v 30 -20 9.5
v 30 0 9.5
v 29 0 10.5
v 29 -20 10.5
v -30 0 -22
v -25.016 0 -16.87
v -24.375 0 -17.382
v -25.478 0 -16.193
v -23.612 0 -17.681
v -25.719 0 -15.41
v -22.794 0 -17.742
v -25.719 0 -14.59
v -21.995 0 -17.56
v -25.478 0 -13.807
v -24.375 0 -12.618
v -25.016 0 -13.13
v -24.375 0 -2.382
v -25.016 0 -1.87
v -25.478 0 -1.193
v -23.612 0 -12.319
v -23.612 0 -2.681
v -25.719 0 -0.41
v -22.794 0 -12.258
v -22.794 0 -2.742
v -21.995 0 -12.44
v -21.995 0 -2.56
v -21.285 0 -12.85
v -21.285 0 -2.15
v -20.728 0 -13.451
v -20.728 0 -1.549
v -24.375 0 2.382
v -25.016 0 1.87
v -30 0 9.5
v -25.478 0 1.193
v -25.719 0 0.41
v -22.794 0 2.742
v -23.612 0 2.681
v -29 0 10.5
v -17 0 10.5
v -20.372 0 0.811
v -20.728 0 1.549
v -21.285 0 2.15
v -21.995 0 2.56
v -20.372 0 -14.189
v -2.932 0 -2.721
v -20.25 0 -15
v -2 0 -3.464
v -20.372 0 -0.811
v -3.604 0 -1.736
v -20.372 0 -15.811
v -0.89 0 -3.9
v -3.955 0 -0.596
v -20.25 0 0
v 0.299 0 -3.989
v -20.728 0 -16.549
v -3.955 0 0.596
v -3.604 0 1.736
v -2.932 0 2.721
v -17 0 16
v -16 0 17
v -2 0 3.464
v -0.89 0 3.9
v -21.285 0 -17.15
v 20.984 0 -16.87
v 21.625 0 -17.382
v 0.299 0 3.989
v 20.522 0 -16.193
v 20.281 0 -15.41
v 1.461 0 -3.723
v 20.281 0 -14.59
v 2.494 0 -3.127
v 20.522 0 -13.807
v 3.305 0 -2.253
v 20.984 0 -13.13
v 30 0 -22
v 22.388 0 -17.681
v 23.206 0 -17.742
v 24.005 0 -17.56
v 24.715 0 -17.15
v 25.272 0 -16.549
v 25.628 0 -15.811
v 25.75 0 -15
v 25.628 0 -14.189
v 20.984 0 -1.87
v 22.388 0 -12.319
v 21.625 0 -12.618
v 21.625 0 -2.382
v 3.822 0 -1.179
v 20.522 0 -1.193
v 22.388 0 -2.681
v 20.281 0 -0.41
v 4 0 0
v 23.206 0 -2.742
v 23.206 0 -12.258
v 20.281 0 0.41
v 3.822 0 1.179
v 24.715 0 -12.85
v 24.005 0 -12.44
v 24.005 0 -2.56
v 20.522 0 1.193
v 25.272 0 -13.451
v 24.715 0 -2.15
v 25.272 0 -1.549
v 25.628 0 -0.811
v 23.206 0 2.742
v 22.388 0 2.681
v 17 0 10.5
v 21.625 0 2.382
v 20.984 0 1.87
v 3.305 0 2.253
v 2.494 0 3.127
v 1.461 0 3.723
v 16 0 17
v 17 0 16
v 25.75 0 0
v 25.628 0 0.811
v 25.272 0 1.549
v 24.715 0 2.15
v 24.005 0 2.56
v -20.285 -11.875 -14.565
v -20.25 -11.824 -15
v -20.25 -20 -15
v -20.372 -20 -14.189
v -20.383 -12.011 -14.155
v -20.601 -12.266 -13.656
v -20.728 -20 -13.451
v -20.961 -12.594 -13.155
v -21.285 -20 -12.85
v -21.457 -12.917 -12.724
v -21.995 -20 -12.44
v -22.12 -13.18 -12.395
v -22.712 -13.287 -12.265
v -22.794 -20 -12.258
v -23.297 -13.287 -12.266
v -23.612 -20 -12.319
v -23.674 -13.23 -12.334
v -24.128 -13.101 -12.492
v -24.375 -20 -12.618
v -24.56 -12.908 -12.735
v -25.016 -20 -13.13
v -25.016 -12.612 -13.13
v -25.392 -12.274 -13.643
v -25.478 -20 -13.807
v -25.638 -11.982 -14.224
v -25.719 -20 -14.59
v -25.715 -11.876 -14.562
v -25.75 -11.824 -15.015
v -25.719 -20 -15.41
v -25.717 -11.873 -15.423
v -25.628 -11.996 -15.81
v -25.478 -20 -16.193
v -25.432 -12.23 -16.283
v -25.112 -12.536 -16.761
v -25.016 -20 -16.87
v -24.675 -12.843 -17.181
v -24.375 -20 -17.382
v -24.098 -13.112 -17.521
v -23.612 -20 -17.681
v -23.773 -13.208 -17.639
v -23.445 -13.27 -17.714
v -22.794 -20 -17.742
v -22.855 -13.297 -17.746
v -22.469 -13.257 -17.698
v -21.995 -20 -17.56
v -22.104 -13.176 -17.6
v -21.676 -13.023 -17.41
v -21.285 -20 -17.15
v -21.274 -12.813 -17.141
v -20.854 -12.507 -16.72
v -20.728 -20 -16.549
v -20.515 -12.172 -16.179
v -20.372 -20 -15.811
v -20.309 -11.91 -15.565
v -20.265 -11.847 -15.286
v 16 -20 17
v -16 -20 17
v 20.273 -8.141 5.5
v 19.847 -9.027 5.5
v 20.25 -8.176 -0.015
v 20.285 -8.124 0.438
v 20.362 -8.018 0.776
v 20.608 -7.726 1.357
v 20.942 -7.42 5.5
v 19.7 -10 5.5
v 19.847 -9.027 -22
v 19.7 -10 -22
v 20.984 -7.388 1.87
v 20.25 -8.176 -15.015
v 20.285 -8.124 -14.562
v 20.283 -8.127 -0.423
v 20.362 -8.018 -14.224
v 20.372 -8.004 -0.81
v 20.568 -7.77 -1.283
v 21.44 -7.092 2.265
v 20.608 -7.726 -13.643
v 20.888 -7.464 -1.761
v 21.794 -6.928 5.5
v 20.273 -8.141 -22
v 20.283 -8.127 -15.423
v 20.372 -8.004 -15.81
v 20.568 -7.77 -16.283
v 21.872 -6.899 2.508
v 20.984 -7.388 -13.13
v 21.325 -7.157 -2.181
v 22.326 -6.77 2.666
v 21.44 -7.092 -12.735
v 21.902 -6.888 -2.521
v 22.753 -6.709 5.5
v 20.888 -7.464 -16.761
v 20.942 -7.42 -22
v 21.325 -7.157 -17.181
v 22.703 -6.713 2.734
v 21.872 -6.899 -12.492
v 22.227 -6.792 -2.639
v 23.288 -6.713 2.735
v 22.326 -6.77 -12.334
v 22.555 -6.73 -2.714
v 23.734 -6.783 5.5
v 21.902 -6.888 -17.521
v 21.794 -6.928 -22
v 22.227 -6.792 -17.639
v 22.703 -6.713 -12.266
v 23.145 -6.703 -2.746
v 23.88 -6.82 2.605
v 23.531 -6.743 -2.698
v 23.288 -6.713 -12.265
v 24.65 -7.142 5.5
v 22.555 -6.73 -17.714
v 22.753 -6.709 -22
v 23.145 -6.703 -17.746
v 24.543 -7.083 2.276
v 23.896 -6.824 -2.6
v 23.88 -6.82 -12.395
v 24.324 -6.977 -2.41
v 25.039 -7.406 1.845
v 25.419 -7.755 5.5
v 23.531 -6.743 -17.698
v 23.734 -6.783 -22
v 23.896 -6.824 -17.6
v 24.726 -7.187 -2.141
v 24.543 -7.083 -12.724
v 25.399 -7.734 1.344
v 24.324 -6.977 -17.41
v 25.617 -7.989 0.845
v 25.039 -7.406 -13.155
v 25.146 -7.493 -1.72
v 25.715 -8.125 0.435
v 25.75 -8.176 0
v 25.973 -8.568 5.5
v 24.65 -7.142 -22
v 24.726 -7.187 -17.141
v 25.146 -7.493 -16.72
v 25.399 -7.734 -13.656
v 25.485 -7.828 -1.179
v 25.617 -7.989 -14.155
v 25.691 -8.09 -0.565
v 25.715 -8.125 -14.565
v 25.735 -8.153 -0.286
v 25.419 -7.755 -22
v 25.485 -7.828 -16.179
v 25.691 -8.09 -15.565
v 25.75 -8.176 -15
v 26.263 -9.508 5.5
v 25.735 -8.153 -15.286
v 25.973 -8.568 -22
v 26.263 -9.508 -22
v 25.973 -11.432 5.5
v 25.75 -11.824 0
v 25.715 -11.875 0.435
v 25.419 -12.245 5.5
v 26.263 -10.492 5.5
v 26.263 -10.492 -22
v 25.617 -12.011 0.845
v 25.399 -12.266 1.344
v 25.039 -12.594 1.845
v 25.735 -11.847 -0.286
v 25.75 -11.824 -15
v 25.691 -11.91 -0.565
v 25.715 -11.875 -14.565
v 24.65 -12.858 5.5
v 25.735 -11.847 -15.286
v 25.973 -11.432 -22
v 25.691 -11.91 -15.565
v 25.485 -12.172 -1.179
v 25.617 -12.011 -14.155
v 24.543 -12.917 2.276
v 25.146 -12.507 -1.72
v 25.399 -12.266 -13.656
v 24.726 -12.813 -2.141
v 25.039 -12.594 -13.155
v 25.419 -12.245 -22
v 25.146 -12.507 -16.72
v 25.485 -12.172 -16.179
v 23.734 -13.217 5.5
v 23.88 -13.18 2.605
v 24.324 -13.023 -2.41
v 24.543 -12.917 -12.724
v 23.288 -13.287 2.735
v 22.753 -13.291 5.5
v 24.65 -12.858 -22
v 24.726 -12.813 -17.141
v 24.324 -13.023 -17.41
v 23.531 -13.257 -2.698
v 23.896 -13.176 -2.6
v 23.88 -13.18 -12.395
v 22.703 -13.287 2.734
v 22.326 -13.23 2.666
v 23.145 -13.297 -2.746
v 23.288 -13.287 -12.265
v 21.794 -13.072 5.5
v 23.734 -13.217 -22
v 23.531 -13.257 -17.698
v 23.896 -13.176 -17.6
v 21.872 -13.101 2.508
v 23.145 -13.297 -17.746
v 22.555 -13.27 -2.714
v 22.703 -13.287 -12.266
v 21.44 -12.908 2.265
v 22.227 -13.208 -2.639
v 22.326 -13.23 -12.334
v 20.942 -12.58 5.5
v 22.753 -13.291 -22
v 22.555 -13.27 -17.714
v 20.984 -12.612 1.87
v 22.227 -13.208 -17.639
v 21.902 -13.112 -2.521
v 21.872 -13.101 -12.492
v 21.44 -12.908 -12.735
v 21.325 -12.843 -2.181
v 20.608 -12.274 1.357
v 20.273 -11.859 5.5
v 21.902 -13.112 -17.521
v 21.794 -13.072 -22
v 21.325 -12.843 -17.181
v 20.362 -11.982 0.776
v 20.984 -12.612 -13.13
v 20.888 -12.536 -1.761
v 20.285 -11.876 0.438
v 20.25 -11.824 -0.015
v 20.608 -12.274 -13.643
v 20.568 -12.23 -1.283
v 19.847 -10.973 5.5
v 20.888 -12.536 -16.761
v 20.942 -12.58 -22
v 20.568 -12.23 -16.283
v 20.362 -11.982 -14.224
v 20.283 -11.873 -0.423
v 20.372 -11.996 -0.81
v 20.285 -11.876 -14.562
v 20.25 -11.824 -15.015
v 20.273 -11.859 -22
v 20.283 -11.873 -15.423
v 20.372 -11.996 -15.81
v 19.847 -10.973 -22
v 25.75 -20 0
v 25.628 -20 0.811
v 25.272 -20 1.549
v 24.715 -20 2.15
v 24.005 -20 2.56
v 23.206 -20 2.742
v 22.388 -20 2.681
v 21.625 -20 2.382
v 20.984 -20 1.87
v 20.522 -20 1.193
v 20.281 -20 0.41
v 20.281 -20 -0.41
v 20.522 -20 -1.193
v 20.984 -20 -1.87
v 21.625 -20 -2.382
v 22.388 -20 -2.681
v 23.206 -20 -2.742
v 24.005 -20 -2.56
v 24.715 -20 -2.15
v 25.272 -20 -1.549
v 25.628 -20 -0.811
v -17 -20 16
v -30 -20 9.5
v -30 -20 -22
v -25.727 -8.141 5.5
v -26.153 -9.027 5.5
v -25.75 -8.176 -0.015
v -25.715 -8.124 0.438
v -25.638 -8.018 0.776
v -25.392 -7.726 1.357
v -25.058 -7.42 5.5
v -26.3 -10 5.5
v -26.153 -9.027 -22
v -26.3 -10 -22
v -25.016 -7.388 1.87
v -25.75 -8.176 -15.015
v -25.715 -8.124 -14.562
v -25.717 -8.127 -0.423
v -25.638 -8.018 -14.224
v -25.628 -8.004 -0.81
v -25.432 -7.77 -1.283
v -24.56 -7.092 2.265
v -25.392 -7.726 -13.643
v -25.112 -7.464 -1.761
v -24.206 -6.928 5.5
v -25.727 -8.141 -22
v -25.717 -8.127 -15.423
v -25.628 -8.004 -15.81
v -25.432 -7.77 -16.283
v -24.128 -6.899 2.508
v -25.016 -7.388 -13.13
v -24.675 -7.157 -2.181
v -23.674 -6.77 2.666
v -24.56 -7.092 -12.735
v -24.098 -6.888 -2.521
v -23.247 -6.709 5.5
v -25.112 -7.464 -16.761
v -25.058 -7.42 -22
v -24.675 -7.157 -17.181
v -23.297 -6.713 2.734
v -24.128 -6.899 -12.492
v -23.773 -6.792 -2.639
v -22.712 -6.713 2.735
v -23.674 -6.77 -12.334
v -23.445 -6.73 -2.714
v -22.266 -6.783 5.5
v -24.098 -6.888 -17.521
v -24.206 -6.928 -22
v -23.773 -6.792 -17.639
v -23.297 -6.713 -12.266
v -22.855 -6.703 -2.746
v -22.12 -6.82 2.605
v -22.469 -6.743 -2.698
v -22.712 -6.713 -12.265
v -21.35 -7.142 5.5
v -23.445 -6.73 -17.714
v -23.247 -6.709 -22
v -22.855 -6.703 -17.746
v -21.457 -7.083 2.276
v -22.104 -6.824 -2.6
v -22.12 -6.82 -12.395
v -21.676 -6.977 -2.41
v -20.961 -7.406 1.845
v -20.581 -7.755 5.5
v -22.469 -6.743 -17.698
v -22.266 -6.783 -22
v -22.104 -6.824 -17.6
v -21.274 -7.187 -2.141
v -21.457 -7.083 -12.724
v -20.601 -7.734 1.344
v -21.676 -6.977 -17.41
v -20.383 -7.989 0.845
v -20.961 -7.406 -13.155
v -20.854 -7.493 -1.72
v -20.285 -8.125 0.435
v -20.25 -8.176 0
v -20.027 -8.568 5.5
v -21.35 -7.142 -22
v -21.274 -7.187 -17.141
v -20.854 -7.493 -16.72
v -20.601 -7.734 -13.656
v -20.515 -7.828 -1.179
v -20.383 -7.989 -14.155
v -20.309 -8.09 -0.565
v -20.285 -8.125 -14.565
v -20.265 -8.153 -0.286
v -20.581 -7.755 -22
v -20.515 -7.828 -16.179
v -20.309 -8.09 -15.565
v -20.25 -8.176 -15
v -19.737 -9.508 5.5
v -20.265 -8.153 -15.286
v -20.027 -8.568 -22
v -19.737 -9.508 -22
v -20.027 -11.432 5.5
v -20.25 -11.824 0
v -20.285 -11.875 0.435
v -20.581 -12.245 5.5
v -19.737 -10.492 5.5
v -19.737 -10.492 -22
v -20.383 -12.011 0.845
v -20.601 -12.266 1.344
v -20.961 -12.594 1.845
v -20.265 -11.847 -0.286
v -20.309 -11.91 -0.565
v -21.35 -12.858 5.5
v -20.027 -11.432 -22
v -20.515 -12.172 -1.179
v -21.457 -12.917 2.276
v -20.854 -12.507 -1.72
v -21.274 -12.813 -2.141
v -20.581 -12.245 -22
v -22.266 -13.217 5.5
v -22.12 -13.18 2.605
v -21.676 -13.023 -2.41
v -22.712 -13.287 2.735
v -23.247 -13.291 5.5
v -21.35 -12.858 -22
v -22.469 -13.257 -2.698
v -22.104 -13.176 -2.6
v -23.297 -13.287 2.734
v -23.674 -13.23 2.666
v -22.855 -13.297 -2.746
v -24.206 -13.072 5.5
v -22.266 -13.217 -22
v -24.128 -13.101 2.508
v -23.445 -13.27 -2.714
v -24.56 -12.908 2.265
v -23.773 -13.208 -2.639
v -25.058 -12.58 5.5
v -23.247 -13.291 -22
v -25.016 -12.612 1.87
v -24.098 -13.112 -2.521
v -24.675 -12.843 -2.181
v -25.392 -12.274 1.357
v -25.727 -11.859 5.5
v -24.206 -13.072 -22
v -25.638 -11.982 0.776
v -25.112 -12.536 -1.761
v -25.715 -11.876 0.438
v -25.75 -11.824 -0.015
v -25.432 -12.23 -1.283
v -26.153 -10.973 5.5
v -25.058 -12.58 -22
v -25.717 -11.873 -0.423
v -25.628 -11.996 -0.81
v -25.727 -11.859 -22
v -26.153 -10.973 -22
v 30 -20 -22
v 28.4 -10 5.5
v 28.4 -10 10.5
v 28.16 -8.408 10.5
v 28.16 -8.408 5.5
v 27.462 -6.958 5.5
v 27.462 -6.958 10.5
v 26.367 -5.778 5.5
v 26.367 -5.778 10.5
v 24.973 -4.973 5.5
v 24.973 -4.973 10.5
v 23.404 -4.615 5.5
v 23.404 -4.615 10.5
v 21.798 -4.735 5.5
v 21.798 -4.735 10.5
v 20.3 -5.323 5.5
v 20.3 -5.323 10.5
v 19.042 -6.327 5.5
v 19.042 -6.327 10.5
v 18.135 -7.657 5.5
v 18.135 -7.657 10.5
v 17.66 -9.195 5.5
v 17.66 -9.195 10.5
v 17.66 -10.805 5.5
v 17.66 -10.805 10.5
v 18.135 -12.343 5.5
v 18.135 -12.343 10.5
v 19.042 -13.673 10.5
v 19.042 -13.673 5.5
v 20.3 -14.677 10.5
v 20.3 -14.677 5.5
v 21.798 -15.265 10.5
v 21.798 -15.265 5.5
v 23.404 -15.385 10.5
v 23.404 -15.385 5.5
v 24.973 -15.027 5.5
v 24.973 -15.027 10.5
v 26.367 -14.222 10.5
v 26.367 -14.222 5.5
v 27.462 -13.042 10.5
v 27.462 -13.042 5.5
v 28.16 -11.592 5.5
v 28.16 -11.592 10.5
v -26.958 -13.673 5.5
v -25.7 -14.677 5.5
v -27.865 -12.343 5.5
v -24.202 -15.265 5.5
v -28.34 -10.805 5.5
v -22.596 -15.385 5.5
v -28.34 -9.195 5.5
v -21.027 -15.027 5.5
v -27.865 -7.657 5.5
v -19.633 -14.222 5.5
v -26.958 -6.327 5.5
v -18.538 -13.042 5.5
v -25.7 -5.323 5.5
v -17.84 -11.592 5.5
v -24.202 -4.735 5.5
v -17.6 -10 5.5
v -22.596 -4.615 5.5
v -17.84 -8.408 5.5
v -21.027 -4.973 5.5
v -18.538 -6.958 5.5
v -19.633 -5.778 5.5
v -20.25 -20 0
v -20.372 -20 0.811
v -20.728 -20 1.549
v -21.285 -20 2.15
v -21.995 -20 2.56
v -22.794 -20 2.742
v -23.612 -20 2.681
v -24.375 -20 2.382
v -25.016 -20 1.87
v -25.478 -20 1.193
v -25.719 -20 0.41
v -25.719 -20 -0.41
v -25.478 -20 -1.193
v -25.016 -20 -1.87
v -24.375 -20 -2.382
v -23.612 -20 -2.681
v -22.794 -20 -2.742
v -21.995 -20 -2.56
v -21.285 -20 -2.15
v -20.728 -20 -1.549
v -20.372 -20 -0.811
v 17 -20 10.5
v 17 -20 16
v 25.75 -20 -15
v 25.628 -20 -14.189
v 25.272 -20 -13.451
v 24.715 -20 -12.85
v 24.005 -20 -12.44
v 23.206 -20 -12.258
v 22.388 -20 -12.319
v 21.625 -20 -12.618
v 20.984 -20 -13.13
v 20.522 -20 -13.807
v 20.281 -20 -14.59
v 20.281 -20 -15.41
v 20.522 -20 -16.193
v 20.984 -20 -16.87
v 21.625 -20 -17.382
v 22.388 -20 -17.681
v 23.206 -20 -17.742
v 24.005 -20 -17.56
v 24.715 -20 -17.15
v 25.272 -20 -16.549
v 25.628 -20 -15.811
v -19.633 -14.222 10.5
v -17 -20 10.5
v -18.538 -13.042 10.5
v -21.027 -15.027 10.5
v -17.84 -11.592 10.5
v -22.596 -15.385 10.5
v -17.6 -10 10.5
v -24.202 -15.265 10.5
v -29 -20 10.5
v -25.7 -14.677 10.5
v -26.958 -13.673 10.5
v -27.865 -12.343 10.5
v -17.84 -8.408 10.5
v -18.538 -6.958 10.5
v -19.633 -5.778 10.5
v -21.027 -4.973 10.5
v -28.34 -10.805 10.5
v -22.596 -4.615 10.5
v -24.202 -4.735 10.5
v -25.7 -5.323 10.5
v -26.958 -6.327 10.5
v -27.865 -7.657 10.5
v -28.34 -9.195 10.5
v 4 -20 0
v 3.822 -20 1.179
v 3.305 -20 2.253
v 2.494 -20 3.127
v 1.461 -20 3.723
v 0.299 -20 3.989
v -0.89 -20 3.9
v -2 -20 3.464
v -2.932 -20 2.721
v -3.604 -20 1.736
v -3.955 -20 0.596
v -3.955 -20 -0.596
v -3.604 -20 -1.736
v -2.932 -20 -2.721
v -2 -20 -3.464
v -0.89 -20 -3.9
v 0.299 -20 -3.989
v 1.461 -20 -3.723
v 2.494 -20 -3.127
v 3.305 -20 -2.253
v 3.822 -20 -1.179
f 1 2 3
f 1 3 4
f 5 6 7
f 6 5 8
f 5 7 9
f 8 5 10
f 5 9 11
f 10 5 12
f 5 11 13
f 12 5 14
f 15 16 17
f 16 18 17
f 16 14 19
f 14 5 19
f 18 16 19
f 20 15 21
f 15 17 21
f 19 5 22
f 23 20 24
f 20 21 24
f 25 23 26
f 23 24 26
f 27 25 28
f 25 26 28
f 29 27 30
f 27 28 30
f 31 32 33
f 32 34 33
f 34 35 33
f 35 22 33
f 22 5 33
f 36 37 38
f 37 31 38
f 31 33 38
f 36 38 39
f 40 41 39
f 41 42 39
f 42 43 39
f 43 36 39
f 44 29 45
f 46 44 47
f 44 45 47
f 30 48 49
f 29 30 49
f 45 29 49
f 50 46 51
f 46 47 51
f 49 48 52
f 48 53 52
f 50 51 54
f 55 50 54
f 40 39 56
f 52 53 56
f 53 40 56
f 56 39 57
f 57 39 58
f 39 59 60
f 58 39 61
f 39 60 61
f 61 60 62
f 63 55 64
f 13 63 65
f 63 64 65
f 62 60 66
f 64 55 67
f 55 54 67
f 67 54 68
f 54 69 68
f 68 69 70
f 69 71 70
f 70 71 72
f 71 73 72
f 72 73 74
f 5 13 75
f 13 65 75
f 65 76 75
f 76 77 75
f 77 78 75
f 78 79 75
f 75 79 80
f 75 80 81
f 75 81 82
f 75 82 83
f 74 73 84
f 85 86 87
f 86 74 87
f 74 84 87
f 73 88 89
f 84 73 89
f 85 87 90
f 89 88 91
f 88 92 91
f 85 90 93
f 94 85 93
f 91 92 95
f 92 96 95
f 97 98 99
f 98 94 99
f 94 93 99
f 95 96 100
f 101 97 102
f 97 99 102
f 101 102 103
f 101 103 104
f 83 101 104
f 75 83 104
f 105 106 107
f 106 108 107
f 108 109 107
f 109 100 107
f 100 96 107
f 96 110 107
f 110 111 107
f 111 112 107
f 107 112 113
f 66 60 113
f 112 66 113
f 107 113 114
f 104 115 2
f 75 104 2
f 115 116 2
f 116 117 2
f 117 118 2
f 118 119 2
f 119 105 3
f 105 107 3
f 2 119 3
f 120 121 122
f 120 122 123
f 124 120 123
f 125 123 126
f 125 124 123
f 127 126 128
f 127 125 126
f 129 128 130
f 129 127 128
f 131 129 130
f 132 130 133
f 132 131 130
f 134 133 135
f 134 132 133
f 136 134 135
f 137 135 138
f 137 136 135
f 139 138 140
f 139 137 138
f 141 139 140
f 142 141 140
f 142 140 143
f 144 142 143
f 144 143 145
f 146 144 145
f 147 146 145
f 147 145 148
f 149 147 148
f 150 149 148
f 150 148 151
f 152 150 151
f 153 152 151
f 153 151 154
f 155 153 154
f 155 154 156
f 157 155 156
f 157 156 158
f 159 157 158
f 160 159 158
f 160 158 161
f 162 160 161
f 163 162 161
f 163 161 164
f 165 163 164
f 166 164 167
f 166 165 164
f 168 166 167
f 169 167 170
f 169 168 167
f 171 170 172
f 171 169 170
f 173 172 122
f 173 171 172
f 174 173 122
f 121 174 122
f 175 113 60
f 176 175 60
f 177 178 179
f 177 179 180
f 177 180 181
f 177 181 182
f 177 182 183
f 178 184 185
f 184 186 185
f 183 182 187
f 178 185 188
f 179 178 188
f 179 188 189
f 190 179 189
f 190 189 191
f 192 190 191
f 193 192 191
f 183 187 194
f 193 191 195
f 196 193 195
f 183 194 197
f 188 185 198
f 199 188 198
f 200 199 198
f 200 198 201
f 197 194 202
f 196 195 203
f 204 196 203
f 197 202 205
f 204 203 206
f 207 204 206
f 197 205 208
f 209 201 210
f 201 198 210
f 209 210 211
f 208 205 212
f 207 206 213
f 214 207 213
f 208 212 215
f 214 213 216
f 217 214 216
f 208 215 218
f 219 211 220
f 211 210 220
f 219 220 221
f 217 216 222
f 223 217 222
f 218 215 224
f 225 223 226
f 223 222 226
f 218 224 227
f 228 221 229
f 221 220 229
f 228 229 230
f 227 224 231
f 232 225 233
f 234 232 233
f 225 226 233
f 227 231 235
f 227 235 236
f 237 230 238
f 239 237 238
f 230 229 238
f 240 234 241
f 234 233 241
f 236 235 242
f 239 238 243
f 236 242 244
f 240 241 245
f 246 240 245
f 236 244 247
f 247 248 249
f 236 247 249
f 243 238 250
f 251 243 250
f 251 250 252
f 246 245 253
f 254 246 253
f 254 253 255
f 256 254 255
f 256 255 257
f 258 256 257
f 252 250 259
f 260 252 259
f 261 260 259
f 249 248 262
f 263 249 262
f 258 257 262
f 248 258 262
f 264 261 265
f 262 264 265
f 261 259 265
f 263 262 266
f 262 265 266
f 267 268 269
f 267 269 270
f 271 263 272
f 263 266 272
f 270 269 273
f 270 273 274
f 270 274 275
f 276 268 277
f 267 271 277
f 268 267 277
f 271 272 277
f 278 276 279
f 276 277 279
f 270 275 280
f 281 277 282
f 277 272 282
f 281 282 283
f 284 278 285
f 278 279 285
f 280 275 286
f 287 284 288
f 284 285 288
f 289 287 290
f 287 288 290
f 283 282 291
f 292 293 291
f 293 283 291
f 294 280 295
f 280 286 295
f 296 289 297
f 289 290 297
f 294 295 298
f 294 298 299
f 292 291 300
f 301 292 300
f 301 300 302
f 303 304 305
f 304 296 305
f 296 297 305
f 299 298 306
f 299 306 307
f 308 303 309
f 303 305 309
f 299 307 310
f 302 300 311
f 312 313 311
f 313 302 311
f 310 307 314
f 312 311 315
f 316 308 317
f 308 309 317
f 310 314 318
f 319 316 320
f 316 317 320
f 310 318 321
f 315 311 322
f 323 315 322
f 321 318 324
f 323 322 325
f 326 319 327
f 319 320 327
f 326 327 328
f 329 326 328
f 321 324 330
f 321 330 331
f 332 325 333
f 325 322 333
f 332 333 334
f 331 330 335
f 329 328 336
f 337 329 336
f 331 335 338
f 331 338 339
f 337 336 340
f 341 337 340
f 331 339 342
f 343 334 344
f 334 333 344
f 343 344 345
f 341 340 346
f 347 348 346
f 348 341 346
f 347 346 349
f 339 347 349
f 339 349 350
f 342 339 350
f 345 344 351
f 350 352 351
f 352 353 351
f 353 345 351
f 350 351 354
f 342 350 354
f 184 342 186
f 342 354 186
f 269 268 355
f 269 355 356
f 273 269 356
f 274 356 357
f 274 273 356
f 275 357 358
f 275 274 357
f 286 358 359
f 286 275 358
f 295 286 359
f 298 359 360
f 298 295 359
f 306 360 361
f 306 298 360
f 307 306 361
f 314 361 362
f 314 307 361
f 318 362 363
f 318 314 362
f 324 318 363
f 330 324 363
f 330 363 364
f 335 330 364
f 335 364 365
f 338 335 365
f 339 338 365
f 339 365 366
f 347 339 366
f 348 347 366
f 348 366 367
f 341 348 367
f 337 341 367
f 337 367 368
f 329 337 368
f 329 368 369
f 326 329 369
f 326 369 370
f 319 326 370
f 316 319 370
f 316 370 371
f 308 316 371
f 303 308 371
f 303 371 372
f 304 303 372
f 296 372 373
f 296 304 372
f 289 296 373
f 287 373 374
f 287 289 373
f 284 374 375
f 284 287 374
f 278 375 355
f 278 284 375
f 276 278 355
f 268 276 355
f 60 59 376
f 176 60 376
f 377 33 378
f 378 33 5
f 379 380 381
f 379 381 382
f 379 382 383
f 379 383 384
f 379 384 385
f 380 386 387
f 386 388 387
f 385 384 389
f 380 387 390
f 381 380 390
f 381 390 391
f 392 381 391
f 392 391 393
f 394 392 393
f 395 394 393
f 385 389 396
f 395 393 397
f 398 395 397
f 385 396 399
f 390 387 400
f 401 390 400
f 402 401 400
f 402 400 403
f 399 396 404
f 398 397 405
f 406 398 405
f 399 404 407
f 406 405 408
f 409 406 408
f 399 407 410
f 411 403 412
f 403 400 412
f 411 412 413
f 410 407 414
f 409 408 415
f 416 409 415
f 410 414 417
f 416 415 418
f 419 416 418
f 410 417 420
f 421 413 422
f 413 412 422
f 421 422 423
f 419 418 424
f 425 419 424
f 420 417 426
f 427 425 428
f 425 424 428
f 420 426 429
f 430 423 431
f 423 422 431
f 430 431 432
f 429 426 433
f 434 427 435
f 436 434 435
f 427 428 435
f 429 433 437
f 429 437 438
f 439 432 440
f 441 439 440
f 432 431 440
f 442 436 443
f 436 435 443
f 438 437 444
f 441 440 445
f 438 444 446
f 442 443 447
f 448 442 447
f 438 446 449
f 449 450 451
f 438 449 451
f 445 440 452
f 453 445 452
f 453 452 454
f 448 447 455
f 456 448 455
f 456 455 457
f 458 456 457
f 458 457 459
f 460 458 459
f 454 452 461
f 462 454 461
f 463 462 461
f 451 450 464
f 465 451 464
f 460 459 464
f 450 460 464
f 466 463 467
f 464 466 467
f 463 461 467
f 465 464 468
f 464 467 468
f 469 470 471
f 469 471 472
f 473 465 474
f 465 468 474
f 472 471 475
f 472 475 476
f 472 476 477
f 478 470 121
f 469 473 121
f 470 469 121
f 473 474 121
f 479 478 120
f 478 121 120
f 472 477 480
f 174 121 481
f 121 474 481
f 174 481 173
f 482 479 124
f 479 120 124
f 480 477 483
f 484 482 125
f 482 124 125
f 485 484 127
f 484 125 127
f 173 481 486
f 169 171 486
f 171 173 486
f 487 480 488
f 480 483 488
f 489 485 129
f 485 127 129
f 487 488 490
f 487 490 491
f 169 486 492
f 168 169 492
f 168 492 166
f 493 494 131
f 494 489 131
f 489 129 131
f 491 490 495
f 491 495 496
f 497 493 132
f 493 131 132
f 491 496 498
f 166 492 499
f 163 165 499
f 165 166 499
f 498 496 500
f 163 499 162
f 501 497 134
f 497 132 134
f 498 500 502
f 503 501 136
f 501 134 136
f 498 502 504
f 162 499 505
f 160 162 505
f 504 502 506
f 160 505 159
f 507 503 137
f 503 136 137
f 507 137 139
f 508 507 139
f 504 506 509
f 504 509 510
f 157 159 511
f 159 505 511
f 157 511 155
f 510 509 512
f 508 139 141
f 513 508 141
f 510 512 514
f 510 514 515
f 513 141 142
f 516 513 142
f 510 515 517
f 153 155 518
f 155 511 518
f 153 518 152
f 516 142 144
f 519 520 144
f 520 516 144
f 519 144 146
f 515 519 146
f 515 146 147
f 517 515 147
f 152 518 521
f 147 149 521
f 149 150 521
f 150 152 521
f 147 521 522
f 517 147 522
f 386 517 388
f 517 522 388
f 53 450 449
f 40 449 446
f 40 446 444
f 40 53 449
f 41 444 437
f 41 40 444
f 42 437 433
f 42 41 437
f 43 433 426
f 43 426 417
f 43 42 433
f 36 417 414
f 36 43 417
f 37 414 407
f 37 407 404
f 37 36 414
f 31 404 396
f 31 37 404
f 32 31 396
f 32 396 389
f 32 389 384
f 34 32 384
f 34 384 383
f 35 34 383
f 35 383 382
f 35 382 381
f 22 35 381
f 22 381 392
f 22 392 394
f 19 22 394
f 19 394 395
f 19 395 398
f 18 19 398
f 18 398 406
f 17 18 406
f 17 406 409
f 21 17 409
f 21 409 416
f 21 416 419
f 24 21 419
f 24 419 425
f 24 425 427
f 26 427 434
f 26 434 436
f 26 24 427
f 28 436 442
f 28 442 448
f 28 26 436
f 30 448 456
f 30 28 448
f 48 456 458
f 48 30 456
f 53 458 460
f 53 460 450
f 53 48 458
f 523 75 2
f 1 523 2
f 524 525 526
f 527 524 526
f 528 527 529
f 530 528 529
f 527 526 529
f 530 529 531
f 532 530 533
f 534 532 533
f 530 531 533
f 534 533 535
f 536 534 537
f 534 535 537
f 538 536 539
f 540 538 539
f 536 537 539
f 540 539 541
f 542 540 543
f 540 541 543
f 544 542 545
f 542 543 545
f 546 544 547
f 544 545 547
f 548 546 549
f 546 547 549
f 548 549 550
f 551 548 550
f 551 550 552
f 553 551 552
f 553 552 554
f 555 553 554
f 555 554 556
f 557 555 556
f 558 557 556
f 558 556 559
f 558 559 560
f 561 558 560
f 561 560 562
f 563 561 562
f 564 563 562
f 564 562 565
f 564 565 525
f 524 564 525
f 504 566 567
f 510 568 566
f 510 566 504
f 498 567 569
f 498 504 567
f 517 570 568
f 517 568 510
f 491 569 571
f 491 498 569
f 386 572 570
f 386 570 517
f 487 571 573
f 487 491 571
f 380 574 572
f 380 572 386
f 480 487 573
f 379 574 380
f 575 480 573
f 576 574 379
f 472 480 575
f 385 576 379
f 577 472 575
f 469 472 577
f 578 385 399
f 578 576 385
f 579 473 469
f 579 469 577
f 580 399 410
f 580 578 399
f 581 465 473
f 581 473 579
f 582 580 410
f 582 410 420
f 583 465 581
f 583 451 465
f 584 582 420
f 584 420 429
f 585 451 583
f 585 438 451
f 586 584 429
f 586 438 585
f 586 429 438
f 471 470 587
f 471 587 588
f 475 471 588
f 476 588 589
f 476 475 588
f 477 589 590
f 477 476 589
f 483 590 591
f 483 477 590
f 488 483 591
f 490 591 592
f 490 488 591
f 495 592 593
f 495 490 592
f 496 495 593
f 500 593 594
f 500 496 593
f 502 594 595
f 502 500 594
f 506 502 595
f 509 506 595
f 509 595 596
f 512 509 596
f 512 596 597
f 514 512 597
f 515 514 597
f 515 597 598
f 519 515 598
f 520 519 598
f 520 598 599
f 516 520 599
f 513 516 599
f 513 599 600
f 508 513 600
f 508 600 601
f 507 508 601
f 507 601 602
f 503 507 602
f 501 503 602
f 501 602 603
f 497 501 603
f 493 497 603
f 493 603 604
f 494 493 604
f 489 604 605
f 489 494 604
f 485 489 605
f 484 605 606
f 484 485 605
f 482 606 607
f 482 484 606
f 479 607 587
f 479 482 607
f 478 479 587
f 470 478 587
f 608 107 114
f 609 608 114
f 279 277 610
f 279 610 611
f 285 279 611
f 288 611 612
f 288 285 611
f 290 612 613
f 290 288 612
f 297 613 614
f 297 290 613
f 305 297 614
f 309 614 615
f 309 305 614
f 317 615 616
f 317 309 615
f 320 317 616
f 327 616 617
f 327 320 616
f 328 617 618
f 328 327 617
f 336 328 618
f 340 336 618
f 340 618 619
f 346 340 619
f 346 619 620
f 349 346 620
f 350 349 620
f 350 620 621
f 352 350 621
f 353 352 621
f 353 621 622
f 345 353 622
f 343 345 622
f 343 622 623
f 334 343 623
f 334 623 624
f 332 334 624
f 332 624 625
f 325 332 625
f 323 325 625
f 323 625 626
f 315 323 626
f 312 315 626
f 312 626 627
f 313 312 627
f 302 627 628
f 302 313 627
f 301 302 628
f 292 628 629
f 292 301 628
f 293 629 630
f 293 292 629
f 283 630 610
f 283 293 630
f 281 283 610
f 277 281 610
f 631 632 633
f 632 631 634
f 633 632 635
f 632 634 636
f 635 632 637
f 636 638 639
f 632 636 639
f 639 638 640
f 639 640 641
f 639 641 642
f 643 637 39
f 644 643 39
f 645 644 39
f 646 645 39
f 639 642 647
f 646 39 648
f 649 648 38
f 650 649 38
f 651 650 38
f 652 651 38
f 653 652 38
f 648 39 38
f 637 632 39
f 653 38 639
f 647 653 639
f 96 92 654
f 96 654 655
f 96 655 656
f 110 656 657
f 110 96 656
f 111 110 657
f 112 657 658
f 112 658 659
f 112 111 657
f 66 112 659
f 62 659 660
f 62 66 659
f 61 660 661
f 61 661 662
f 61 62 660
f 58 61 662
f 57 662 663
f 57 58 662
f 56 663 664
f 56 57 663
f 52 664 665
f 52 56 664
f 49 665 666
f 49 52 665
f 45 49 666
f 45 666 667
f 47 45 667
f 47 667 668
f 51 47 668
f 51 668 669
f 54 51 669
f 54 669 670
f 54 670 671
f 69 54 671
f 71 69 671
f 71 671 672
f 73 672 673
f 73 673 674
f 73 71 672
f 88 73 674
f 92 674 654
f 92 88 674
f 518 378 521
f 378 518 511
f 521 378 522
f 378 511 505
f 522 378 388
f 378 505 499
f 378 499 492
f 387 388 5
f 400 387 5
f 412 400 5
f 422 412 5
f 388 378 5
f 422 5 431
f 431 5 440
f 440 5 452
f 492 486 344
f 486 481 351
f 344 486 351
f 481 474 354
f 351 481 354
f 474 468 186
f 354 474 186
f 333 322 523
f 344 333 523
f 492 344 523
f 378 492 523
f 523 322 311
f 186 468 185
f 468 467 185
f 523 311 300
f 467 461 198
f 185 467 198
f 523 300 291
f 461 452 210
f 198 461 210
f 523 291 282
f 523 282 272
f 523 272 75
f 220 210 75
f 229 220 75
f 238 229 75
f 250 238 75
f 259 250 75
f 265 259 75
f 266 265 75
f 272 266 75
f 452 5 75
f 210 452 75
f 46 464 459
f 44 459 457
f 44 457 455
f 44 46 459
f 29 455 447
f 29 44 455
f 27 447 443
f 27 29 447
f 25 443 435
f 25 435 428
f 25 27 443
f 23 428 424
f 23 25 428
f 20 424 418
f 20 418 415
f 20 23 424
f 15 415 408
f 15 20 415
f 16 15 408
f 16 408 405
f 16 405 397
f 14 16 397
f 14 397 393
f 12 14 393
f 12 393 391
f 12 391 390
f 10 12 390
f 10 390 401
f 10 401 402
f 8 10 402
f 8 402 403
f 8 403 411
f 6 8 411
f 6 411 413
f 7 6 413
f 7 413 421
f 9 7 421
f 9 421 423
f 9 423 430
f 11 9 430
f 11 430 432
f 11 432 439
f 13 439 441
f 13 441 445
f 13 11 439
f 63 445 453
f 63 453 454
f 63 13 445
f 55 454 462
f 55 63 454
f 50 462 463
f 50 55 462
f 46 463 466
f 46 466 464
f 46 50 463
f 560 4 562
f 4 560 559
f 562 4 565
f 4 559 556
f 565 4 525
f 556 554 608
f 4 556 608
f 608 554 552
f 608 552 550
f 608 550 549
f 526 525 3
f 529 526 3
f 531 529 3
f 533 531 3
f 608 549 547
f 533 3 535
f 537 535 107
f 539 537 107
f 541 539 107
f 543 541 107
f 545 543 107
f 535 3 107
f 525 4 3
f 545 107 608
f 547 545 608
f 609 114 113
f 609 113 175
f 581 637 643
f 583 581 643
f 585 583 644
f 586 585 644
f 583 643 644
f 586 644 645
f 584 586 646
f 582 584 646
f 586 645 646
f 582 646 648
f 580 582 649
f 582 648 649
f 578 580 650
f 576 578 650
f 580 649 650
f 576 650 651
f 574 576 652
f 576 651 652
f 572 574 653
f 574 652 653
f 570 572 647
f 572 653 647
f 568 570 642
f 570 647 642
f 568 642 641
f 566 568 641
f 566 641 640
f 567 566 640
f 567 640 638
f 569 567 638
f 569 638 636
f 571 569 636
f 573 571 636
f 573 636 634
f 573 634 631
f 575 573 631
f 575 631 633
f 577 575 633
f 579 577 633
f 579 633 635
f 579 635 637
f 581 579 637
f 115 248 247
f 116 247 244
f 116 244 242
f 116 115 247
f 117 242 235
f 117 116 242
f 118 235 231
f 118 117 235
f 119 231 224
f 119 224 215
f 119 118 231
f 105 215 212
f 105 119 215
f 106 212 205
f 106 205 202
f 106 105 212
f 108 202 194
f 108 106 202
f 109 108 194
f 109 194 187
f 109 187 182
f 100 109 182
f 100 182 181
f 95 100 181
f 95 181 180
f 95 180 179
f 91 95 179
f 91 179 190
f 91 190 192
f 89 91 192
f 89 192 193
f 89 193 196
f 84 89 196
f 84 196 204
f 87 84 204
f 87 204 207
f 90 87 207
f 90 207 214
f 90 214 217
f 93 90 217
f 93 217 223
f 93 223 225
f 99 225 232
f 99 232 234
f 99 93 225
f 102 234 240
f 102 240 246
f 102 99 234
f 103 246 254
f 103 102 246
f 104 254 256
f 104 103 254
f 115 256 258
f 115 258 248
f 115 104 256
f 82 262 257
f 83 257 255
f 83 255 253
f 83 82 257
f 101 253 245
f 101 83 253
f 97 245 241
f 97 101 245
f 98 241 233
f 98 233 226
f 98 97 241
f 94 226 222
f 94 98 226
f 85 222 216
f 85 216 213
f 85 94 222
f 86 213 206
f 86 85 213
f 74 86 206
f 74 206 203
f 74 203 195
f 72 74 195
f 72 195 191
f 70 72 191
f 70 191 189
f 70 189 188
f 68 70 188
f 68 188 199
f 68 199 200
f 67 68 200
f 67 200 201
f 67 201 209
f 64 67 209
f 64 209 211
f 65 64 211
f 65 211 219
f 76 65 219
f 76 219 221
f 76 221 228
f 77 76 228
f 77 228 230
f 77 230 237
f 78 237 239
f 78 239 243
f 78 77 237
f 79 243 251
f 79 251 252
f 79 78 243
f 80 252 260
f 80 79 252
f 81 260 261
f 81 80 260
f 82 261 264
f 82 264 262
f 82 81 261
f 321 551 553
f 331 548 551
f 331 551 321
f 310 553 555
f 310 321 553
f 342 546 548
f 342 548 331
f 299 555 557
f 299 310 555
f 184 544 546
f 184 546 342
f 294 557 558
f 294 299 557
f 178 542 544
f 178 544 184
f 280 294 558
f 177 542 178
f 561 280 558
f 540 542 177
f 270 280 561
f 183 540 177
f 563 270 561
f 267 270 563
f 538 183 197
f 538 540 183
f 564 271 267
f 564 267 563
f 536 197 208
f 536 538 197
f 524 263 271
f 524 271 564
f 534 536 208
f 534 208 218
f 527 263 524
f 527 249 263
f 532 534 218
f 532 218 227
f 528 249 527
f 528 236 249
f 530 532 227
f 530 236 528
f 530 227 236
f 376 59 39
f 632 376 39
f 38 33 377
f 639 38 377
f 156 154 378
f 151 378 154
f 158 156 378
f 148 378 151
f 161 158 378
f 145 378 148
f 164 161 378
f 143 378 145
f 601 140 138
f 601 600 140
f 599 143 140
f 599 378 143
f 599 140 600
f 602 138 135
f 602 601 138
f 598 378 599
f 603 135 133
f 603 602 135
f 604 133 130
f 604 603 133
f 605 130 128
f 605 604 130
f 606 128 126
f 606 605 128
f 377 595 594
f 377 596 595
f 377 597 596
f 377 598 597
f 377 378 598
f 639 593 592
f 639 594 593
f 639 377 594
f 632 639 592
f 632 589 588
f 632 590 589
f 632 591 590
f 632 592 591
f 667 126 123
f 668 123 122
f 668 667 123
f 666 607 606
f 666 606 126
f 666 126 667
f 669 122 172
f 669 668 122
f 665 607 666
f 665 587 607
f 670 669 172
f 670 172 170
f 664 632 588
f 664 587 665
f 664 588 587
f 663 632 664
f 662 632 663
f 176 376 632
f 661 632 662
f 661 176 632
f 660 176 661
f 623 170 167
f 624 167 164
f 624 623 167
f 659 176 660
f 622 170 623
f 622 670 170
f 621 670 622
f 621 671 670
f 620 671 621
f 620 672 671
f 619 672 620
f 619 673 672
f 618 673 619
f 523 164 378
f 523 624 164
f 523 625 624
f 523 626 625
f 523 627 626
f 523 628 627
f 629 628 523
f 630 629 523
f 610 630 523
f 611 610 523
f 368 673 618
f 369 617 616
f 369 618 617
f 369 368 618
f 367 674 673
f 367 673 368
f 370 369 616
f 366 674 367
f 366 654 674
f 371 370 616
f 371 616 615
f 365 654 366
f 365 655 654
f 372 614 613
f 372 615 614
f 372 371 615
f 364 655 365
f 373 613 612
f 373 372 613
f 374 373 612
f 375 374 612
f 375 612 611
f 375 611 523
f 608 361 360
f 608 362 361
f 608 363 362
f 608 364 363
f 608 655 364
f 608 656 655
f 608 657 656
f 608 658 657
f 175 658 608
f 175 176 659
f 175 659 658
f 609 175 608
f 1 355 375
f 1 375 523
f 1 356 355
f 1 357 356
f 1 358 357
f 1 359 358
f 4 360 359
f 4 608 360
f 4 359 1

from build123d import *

# Parameters (mm, degrees)
F0_R           = 2.75
F0_R_2         = 4
F1_DEPTH       = 20
F2_SIZE        = 1
F4_D           = 6.6
F4_CBORE_D     = 10.8
F4_CBORE_DEPTH = 5


with BuildPart() as f1:
    # F0 (on Front) → F1 (new body)
    with BuildSketch(Plane.XZ):
        Polygon((17, 17), (-17, 17), (-17, 10.5), (-30, 10.5), (-30, -22), (30, -22), (30, 10.5), (17, 10.5), align=None)
        with Locations((-23, -15)):
            Circle(F0_R, mode=Mode.SUBTRACT)
        with Locations((23, -15)):
            Circle(F0_R, mode=Mode.SUBTRACT)
        with Locations((-23, 0)):
            Circle(F0_R, mode=Mode.SUBTRACT)
        Circle(F0_R_2, mode=Mode.SUBTRACT)
        with Locations((23, 0)):
            Circle(F0_R, mode=Mode.SUBTRACT)
    extrude(amount=F1_DEPTH)

    # F2
    f2_edges = [f1.edges().sort_by_distance(p)[0] for p in [
        (17, -10, 17),
        (-17, -10, 17),
        (30, -10, 10.5),
        (-30, -10, 10.5),
    ]]
    chamfer(f2_edges, length=F2_SIZE)

    # F4 (through all)
    with Locations(Plane.XY.offset(10.5)):
        with Locations((-23, -10), (23, -10)):
            CounterBoreHole(F4_D / 2, F4_CBORE_D / 2, F4_CBORE_DEPTH)


solid = f1.part
